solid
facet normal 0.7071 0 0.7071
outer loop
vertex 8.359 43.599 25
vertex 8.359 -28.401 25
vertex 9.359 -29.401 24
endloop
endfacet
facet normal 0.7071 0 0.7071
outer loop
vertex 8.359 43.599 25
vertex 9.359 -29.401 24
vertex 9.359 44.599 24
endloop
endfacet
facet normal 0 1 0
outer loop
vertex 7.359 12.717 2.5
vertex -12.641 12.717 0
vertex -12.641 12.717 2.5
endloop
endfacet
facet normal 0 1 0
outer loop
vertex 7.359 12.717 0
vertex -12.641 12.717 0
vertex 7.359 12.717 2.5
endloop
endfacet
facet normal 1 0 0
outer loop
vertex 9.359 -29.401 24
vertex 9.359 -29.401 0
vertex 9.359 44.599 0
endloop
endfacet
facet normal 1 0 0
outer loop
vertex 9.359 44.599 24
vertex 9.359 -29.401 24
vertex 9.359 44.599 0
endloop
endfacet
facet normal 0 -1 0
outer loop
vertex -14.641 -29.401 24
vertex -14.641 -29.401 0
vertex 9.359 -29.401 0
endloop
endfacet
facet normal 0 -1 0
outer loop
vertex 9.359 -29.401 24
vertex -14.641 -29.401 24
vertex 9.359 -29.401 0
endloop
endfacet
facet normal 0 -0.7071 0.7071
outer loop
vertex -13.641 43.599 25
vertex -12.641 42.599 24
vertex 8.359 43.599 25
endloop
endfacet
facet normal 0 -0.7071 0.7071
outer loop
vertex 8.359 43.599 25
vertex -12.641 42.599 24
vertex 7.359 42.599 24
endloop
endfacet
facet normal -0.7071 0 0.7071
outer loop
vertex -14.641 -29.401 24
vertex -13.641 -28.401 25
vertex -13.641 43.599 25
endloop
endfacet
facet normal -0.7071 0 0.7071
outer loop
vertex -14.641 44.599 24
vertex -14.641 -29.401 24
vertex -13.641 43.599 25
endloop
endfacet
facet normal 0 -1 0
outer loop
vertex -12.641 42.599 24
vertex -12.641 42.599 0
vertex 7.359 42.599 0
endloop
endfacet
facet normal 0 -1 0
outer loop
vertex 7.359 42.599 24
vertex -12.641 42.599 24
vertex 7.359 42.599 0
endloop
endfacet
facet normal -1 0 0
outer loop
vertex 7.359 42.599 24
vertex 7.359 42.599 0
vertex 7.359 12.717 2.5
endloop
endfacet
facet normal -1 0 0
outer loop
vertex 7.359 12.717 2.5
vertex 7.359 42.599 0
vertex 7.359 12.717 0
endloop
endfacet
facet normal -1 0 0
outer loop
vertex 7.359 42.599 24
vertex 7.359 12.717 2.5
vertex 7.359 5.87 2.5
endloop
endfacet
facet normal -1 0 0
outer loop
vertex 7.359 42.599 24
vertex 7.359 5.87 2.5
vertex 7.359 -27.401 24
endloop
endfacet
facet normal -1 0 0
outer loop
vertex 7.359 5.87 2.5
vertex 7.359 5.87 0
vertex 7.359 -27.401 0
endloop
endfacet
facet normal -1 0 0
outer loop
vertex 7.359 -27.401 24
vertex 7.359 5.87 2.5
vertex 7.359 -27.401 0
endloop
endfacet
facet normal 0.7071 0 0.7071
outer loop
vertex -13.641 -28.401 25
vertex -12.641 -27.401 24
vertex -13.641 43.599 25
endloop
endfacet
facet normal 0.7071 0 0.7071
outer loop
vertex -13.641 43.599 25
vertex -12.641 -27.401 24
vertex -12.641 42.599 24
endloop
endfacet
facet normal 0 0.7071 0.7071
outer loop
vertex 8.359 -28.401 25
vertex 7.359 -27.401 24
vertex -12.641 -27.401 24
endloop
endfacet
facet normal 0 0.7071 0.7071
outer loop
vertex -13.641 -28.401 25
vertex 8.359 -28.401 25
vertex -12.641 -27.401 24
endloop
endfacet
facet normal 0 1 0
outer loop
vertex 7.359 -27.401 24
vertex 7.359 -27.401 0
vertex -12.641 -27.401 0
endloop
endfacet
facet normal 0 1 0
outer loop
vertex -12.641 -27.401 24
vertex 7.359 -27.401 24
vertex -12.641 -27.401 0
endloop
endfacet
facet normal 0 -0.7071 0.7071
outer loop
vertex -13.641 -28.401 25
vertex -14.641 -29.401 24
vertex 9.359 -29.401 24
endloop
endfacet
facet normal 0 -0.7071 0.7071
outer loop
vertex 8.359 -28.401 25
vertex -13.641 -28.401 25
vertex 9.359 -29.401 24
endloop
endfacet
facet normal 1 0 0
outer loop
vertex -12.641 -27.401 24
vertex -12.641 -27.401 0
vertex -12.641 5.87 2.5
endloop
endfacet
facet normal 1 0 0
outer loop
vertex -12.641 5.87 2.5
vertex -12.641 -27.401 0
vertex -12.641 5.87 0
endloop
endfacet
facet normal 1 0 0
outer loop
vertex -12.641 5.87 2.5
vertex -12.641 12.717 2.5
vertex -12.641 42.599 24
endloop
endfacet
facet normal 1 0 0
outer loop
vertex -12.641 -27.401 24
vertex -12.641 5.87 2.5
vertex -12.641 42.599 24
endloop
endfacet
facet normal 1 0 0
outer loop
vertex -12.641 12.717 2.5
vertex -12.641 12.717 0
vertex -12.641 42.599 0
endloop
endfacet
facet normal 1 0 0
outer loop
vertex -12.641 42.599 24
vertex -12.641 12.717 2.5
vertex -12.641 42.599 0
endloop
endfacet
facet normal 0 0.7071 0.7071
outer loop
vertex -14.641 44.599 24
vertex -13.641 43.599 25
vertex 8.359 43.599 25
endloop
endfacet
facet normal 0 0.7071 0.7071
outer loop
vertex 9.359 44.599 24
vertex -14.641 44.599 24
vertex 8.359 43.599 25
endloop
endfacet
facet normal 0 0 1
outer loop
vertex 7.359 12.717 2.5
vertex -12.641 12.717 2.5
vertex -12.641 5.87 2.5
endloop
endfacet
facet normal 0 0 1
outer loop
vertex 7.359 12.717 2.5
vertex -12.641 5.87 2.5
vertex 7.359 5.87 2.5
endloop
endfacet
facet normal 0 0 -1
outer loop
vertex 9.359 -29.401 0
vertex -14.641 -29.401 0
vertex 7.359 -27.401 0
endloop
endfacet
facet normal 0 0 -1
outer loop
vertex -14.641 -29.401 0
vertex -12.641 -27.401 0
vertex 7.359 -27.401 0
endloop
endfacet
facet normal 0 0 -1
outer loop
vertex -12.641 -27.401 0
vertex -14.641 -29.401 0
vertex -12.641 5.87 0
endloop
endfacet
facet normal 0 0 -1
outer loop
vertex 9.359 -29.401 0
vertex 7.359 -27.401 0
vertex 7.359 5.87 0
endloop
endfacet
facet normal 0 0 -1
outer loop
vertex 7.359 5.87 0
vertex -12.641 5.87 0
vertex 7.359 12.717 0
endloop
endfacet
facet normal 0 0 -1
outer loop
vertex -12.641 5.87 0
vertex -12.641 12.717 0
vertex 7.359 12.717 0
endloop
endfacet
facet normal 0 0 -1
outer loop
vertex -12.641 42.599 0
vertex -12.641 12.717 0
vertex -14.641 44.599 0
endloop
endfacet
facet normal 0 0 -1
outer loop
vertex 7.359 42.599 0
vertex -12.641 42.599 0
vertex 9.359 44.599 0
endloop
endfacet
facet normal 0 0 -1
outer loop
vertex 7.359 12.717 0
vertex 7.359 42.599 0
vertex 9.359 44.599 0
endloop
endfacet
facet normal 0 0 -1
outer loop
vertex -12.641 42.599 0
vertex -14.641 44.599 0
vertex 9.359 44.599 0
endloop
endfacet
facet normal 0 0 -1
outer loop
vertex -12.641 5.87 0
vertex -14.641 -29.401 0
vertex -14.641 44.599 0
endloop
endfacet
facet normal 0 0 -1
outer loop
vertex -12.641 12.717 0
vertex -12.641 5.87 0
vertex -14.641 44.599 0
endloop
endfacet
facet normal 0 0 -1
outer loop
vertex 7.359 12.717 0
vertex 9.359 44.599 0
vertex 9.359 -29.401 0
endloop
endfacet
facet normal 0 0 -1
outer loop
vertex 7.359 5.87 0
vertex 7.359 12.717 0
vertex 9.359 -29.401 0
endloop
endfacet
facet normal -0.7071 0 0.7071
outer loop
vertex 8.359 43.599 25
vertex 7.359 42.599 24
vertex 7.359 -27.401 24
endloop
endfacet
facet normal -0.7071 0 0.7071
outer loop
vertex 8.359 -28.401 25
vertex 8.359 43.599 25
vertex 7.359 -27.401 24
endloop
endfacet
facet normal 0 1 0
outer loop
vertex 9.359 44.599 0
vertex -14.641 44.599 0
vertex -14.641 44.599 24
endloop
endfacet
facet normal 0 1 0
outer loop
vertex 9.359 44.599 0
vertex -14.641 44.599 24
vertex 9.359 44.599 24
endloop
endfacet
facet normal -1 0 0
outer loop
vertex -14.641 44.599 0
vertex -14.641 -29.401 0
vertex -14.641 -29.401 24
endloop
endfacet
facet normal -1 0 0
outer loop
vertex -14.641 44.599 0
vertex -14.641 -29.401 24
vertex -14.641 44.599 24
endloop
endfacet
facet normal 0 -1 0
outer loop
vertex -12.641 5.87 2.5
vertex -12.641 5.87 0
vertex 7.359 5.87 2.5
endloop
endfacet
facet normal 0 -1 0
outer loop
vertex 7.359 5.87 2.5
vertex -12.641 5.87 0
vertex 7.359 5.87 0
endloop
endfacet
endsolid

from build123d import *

# Parameters (mm, degrees)
F0_W     = 23.9999974624
F0_H     = 73.9999974624
F1_DEPTH = 25
F0_W_2   = 20
F0_H_2   = 6.8478258327
F2_DEPTH = 2.5
F3_SIZE  = 0.99999


# Not quite as in the source:
# - a fillet or chamfer is up to 0.001 mm smaller than in the source, because OpenCascade refuses the exact size


with BuildPart() as f1:
    # F0 (on Top) → F1 (new body)
    with BuildSketch(Plane.XY):
        with Locations((-2.6413043961, 7.5985620491)):
            Rectangle(F0_W, F0_H)
        Polygon((-12.6413043961, 12.7173913643), (-12.6413043961, 42.5985620491), (7.3586956039, 42.5985620491), (7.3586956039, 12.7173913643), (7.3586956039, 5.8695655316), (7.3586956039, -27.4014379509), (-12.6413043961, -27.4014379509), (-12.6413043961, 5.8695655316), align=None, mode=Mode.SUBTRACT)
    extrude(amount=F1_DEPTH)

    # F0 (on Top) → F2 (join)
    with BuildSketch(Plane.XY):
        with Locations((-2.6413043961, 7.5985620491)):
            Rectangle(F0_W, F0_H)
        Polygon((-12.6413043961, 12.7173913643), (-12.6413043961, 42.5985620491), (7.3586956039, 42.5985620491), (7.3586956039, 12.7173913643), (7.3586956039, 5.8695655316), (7.3586956039, -27.4014379509), (-12.6413043961, -27.4014379509), (-12.6413043961, 5.8695655316), align=None, mode=Mode.SUBTRACT)
        with Locations((-2.6413043961, 9.2934784479)):
            Rectangle(F0_W_2, F0_H_2)
    extrude(amount=F2_DEPTH)

    # F3 (size 1 in the source; OpenCascade refuses exactly that, so slightly less here)
    f3_edges = [f1.edges().sort_by_distance(p)[0] for p in [
        (-2.641304, -29.401437, 25),
        (-14.641303, 7.598562, 25),
        (9.358694, 7.598562, 25),
        (-2.641304, 44.598561, 25),
        (-2.641304, 42.598562, 25),
        (7.358696, 7.598562, 25),
        (-12.641304, 7.598562, 25),
        (-2.641304, -27.401438, 25),
    ]]
    chamfer(f3_edges, length=F3_SIZE)


solid = f1.part
